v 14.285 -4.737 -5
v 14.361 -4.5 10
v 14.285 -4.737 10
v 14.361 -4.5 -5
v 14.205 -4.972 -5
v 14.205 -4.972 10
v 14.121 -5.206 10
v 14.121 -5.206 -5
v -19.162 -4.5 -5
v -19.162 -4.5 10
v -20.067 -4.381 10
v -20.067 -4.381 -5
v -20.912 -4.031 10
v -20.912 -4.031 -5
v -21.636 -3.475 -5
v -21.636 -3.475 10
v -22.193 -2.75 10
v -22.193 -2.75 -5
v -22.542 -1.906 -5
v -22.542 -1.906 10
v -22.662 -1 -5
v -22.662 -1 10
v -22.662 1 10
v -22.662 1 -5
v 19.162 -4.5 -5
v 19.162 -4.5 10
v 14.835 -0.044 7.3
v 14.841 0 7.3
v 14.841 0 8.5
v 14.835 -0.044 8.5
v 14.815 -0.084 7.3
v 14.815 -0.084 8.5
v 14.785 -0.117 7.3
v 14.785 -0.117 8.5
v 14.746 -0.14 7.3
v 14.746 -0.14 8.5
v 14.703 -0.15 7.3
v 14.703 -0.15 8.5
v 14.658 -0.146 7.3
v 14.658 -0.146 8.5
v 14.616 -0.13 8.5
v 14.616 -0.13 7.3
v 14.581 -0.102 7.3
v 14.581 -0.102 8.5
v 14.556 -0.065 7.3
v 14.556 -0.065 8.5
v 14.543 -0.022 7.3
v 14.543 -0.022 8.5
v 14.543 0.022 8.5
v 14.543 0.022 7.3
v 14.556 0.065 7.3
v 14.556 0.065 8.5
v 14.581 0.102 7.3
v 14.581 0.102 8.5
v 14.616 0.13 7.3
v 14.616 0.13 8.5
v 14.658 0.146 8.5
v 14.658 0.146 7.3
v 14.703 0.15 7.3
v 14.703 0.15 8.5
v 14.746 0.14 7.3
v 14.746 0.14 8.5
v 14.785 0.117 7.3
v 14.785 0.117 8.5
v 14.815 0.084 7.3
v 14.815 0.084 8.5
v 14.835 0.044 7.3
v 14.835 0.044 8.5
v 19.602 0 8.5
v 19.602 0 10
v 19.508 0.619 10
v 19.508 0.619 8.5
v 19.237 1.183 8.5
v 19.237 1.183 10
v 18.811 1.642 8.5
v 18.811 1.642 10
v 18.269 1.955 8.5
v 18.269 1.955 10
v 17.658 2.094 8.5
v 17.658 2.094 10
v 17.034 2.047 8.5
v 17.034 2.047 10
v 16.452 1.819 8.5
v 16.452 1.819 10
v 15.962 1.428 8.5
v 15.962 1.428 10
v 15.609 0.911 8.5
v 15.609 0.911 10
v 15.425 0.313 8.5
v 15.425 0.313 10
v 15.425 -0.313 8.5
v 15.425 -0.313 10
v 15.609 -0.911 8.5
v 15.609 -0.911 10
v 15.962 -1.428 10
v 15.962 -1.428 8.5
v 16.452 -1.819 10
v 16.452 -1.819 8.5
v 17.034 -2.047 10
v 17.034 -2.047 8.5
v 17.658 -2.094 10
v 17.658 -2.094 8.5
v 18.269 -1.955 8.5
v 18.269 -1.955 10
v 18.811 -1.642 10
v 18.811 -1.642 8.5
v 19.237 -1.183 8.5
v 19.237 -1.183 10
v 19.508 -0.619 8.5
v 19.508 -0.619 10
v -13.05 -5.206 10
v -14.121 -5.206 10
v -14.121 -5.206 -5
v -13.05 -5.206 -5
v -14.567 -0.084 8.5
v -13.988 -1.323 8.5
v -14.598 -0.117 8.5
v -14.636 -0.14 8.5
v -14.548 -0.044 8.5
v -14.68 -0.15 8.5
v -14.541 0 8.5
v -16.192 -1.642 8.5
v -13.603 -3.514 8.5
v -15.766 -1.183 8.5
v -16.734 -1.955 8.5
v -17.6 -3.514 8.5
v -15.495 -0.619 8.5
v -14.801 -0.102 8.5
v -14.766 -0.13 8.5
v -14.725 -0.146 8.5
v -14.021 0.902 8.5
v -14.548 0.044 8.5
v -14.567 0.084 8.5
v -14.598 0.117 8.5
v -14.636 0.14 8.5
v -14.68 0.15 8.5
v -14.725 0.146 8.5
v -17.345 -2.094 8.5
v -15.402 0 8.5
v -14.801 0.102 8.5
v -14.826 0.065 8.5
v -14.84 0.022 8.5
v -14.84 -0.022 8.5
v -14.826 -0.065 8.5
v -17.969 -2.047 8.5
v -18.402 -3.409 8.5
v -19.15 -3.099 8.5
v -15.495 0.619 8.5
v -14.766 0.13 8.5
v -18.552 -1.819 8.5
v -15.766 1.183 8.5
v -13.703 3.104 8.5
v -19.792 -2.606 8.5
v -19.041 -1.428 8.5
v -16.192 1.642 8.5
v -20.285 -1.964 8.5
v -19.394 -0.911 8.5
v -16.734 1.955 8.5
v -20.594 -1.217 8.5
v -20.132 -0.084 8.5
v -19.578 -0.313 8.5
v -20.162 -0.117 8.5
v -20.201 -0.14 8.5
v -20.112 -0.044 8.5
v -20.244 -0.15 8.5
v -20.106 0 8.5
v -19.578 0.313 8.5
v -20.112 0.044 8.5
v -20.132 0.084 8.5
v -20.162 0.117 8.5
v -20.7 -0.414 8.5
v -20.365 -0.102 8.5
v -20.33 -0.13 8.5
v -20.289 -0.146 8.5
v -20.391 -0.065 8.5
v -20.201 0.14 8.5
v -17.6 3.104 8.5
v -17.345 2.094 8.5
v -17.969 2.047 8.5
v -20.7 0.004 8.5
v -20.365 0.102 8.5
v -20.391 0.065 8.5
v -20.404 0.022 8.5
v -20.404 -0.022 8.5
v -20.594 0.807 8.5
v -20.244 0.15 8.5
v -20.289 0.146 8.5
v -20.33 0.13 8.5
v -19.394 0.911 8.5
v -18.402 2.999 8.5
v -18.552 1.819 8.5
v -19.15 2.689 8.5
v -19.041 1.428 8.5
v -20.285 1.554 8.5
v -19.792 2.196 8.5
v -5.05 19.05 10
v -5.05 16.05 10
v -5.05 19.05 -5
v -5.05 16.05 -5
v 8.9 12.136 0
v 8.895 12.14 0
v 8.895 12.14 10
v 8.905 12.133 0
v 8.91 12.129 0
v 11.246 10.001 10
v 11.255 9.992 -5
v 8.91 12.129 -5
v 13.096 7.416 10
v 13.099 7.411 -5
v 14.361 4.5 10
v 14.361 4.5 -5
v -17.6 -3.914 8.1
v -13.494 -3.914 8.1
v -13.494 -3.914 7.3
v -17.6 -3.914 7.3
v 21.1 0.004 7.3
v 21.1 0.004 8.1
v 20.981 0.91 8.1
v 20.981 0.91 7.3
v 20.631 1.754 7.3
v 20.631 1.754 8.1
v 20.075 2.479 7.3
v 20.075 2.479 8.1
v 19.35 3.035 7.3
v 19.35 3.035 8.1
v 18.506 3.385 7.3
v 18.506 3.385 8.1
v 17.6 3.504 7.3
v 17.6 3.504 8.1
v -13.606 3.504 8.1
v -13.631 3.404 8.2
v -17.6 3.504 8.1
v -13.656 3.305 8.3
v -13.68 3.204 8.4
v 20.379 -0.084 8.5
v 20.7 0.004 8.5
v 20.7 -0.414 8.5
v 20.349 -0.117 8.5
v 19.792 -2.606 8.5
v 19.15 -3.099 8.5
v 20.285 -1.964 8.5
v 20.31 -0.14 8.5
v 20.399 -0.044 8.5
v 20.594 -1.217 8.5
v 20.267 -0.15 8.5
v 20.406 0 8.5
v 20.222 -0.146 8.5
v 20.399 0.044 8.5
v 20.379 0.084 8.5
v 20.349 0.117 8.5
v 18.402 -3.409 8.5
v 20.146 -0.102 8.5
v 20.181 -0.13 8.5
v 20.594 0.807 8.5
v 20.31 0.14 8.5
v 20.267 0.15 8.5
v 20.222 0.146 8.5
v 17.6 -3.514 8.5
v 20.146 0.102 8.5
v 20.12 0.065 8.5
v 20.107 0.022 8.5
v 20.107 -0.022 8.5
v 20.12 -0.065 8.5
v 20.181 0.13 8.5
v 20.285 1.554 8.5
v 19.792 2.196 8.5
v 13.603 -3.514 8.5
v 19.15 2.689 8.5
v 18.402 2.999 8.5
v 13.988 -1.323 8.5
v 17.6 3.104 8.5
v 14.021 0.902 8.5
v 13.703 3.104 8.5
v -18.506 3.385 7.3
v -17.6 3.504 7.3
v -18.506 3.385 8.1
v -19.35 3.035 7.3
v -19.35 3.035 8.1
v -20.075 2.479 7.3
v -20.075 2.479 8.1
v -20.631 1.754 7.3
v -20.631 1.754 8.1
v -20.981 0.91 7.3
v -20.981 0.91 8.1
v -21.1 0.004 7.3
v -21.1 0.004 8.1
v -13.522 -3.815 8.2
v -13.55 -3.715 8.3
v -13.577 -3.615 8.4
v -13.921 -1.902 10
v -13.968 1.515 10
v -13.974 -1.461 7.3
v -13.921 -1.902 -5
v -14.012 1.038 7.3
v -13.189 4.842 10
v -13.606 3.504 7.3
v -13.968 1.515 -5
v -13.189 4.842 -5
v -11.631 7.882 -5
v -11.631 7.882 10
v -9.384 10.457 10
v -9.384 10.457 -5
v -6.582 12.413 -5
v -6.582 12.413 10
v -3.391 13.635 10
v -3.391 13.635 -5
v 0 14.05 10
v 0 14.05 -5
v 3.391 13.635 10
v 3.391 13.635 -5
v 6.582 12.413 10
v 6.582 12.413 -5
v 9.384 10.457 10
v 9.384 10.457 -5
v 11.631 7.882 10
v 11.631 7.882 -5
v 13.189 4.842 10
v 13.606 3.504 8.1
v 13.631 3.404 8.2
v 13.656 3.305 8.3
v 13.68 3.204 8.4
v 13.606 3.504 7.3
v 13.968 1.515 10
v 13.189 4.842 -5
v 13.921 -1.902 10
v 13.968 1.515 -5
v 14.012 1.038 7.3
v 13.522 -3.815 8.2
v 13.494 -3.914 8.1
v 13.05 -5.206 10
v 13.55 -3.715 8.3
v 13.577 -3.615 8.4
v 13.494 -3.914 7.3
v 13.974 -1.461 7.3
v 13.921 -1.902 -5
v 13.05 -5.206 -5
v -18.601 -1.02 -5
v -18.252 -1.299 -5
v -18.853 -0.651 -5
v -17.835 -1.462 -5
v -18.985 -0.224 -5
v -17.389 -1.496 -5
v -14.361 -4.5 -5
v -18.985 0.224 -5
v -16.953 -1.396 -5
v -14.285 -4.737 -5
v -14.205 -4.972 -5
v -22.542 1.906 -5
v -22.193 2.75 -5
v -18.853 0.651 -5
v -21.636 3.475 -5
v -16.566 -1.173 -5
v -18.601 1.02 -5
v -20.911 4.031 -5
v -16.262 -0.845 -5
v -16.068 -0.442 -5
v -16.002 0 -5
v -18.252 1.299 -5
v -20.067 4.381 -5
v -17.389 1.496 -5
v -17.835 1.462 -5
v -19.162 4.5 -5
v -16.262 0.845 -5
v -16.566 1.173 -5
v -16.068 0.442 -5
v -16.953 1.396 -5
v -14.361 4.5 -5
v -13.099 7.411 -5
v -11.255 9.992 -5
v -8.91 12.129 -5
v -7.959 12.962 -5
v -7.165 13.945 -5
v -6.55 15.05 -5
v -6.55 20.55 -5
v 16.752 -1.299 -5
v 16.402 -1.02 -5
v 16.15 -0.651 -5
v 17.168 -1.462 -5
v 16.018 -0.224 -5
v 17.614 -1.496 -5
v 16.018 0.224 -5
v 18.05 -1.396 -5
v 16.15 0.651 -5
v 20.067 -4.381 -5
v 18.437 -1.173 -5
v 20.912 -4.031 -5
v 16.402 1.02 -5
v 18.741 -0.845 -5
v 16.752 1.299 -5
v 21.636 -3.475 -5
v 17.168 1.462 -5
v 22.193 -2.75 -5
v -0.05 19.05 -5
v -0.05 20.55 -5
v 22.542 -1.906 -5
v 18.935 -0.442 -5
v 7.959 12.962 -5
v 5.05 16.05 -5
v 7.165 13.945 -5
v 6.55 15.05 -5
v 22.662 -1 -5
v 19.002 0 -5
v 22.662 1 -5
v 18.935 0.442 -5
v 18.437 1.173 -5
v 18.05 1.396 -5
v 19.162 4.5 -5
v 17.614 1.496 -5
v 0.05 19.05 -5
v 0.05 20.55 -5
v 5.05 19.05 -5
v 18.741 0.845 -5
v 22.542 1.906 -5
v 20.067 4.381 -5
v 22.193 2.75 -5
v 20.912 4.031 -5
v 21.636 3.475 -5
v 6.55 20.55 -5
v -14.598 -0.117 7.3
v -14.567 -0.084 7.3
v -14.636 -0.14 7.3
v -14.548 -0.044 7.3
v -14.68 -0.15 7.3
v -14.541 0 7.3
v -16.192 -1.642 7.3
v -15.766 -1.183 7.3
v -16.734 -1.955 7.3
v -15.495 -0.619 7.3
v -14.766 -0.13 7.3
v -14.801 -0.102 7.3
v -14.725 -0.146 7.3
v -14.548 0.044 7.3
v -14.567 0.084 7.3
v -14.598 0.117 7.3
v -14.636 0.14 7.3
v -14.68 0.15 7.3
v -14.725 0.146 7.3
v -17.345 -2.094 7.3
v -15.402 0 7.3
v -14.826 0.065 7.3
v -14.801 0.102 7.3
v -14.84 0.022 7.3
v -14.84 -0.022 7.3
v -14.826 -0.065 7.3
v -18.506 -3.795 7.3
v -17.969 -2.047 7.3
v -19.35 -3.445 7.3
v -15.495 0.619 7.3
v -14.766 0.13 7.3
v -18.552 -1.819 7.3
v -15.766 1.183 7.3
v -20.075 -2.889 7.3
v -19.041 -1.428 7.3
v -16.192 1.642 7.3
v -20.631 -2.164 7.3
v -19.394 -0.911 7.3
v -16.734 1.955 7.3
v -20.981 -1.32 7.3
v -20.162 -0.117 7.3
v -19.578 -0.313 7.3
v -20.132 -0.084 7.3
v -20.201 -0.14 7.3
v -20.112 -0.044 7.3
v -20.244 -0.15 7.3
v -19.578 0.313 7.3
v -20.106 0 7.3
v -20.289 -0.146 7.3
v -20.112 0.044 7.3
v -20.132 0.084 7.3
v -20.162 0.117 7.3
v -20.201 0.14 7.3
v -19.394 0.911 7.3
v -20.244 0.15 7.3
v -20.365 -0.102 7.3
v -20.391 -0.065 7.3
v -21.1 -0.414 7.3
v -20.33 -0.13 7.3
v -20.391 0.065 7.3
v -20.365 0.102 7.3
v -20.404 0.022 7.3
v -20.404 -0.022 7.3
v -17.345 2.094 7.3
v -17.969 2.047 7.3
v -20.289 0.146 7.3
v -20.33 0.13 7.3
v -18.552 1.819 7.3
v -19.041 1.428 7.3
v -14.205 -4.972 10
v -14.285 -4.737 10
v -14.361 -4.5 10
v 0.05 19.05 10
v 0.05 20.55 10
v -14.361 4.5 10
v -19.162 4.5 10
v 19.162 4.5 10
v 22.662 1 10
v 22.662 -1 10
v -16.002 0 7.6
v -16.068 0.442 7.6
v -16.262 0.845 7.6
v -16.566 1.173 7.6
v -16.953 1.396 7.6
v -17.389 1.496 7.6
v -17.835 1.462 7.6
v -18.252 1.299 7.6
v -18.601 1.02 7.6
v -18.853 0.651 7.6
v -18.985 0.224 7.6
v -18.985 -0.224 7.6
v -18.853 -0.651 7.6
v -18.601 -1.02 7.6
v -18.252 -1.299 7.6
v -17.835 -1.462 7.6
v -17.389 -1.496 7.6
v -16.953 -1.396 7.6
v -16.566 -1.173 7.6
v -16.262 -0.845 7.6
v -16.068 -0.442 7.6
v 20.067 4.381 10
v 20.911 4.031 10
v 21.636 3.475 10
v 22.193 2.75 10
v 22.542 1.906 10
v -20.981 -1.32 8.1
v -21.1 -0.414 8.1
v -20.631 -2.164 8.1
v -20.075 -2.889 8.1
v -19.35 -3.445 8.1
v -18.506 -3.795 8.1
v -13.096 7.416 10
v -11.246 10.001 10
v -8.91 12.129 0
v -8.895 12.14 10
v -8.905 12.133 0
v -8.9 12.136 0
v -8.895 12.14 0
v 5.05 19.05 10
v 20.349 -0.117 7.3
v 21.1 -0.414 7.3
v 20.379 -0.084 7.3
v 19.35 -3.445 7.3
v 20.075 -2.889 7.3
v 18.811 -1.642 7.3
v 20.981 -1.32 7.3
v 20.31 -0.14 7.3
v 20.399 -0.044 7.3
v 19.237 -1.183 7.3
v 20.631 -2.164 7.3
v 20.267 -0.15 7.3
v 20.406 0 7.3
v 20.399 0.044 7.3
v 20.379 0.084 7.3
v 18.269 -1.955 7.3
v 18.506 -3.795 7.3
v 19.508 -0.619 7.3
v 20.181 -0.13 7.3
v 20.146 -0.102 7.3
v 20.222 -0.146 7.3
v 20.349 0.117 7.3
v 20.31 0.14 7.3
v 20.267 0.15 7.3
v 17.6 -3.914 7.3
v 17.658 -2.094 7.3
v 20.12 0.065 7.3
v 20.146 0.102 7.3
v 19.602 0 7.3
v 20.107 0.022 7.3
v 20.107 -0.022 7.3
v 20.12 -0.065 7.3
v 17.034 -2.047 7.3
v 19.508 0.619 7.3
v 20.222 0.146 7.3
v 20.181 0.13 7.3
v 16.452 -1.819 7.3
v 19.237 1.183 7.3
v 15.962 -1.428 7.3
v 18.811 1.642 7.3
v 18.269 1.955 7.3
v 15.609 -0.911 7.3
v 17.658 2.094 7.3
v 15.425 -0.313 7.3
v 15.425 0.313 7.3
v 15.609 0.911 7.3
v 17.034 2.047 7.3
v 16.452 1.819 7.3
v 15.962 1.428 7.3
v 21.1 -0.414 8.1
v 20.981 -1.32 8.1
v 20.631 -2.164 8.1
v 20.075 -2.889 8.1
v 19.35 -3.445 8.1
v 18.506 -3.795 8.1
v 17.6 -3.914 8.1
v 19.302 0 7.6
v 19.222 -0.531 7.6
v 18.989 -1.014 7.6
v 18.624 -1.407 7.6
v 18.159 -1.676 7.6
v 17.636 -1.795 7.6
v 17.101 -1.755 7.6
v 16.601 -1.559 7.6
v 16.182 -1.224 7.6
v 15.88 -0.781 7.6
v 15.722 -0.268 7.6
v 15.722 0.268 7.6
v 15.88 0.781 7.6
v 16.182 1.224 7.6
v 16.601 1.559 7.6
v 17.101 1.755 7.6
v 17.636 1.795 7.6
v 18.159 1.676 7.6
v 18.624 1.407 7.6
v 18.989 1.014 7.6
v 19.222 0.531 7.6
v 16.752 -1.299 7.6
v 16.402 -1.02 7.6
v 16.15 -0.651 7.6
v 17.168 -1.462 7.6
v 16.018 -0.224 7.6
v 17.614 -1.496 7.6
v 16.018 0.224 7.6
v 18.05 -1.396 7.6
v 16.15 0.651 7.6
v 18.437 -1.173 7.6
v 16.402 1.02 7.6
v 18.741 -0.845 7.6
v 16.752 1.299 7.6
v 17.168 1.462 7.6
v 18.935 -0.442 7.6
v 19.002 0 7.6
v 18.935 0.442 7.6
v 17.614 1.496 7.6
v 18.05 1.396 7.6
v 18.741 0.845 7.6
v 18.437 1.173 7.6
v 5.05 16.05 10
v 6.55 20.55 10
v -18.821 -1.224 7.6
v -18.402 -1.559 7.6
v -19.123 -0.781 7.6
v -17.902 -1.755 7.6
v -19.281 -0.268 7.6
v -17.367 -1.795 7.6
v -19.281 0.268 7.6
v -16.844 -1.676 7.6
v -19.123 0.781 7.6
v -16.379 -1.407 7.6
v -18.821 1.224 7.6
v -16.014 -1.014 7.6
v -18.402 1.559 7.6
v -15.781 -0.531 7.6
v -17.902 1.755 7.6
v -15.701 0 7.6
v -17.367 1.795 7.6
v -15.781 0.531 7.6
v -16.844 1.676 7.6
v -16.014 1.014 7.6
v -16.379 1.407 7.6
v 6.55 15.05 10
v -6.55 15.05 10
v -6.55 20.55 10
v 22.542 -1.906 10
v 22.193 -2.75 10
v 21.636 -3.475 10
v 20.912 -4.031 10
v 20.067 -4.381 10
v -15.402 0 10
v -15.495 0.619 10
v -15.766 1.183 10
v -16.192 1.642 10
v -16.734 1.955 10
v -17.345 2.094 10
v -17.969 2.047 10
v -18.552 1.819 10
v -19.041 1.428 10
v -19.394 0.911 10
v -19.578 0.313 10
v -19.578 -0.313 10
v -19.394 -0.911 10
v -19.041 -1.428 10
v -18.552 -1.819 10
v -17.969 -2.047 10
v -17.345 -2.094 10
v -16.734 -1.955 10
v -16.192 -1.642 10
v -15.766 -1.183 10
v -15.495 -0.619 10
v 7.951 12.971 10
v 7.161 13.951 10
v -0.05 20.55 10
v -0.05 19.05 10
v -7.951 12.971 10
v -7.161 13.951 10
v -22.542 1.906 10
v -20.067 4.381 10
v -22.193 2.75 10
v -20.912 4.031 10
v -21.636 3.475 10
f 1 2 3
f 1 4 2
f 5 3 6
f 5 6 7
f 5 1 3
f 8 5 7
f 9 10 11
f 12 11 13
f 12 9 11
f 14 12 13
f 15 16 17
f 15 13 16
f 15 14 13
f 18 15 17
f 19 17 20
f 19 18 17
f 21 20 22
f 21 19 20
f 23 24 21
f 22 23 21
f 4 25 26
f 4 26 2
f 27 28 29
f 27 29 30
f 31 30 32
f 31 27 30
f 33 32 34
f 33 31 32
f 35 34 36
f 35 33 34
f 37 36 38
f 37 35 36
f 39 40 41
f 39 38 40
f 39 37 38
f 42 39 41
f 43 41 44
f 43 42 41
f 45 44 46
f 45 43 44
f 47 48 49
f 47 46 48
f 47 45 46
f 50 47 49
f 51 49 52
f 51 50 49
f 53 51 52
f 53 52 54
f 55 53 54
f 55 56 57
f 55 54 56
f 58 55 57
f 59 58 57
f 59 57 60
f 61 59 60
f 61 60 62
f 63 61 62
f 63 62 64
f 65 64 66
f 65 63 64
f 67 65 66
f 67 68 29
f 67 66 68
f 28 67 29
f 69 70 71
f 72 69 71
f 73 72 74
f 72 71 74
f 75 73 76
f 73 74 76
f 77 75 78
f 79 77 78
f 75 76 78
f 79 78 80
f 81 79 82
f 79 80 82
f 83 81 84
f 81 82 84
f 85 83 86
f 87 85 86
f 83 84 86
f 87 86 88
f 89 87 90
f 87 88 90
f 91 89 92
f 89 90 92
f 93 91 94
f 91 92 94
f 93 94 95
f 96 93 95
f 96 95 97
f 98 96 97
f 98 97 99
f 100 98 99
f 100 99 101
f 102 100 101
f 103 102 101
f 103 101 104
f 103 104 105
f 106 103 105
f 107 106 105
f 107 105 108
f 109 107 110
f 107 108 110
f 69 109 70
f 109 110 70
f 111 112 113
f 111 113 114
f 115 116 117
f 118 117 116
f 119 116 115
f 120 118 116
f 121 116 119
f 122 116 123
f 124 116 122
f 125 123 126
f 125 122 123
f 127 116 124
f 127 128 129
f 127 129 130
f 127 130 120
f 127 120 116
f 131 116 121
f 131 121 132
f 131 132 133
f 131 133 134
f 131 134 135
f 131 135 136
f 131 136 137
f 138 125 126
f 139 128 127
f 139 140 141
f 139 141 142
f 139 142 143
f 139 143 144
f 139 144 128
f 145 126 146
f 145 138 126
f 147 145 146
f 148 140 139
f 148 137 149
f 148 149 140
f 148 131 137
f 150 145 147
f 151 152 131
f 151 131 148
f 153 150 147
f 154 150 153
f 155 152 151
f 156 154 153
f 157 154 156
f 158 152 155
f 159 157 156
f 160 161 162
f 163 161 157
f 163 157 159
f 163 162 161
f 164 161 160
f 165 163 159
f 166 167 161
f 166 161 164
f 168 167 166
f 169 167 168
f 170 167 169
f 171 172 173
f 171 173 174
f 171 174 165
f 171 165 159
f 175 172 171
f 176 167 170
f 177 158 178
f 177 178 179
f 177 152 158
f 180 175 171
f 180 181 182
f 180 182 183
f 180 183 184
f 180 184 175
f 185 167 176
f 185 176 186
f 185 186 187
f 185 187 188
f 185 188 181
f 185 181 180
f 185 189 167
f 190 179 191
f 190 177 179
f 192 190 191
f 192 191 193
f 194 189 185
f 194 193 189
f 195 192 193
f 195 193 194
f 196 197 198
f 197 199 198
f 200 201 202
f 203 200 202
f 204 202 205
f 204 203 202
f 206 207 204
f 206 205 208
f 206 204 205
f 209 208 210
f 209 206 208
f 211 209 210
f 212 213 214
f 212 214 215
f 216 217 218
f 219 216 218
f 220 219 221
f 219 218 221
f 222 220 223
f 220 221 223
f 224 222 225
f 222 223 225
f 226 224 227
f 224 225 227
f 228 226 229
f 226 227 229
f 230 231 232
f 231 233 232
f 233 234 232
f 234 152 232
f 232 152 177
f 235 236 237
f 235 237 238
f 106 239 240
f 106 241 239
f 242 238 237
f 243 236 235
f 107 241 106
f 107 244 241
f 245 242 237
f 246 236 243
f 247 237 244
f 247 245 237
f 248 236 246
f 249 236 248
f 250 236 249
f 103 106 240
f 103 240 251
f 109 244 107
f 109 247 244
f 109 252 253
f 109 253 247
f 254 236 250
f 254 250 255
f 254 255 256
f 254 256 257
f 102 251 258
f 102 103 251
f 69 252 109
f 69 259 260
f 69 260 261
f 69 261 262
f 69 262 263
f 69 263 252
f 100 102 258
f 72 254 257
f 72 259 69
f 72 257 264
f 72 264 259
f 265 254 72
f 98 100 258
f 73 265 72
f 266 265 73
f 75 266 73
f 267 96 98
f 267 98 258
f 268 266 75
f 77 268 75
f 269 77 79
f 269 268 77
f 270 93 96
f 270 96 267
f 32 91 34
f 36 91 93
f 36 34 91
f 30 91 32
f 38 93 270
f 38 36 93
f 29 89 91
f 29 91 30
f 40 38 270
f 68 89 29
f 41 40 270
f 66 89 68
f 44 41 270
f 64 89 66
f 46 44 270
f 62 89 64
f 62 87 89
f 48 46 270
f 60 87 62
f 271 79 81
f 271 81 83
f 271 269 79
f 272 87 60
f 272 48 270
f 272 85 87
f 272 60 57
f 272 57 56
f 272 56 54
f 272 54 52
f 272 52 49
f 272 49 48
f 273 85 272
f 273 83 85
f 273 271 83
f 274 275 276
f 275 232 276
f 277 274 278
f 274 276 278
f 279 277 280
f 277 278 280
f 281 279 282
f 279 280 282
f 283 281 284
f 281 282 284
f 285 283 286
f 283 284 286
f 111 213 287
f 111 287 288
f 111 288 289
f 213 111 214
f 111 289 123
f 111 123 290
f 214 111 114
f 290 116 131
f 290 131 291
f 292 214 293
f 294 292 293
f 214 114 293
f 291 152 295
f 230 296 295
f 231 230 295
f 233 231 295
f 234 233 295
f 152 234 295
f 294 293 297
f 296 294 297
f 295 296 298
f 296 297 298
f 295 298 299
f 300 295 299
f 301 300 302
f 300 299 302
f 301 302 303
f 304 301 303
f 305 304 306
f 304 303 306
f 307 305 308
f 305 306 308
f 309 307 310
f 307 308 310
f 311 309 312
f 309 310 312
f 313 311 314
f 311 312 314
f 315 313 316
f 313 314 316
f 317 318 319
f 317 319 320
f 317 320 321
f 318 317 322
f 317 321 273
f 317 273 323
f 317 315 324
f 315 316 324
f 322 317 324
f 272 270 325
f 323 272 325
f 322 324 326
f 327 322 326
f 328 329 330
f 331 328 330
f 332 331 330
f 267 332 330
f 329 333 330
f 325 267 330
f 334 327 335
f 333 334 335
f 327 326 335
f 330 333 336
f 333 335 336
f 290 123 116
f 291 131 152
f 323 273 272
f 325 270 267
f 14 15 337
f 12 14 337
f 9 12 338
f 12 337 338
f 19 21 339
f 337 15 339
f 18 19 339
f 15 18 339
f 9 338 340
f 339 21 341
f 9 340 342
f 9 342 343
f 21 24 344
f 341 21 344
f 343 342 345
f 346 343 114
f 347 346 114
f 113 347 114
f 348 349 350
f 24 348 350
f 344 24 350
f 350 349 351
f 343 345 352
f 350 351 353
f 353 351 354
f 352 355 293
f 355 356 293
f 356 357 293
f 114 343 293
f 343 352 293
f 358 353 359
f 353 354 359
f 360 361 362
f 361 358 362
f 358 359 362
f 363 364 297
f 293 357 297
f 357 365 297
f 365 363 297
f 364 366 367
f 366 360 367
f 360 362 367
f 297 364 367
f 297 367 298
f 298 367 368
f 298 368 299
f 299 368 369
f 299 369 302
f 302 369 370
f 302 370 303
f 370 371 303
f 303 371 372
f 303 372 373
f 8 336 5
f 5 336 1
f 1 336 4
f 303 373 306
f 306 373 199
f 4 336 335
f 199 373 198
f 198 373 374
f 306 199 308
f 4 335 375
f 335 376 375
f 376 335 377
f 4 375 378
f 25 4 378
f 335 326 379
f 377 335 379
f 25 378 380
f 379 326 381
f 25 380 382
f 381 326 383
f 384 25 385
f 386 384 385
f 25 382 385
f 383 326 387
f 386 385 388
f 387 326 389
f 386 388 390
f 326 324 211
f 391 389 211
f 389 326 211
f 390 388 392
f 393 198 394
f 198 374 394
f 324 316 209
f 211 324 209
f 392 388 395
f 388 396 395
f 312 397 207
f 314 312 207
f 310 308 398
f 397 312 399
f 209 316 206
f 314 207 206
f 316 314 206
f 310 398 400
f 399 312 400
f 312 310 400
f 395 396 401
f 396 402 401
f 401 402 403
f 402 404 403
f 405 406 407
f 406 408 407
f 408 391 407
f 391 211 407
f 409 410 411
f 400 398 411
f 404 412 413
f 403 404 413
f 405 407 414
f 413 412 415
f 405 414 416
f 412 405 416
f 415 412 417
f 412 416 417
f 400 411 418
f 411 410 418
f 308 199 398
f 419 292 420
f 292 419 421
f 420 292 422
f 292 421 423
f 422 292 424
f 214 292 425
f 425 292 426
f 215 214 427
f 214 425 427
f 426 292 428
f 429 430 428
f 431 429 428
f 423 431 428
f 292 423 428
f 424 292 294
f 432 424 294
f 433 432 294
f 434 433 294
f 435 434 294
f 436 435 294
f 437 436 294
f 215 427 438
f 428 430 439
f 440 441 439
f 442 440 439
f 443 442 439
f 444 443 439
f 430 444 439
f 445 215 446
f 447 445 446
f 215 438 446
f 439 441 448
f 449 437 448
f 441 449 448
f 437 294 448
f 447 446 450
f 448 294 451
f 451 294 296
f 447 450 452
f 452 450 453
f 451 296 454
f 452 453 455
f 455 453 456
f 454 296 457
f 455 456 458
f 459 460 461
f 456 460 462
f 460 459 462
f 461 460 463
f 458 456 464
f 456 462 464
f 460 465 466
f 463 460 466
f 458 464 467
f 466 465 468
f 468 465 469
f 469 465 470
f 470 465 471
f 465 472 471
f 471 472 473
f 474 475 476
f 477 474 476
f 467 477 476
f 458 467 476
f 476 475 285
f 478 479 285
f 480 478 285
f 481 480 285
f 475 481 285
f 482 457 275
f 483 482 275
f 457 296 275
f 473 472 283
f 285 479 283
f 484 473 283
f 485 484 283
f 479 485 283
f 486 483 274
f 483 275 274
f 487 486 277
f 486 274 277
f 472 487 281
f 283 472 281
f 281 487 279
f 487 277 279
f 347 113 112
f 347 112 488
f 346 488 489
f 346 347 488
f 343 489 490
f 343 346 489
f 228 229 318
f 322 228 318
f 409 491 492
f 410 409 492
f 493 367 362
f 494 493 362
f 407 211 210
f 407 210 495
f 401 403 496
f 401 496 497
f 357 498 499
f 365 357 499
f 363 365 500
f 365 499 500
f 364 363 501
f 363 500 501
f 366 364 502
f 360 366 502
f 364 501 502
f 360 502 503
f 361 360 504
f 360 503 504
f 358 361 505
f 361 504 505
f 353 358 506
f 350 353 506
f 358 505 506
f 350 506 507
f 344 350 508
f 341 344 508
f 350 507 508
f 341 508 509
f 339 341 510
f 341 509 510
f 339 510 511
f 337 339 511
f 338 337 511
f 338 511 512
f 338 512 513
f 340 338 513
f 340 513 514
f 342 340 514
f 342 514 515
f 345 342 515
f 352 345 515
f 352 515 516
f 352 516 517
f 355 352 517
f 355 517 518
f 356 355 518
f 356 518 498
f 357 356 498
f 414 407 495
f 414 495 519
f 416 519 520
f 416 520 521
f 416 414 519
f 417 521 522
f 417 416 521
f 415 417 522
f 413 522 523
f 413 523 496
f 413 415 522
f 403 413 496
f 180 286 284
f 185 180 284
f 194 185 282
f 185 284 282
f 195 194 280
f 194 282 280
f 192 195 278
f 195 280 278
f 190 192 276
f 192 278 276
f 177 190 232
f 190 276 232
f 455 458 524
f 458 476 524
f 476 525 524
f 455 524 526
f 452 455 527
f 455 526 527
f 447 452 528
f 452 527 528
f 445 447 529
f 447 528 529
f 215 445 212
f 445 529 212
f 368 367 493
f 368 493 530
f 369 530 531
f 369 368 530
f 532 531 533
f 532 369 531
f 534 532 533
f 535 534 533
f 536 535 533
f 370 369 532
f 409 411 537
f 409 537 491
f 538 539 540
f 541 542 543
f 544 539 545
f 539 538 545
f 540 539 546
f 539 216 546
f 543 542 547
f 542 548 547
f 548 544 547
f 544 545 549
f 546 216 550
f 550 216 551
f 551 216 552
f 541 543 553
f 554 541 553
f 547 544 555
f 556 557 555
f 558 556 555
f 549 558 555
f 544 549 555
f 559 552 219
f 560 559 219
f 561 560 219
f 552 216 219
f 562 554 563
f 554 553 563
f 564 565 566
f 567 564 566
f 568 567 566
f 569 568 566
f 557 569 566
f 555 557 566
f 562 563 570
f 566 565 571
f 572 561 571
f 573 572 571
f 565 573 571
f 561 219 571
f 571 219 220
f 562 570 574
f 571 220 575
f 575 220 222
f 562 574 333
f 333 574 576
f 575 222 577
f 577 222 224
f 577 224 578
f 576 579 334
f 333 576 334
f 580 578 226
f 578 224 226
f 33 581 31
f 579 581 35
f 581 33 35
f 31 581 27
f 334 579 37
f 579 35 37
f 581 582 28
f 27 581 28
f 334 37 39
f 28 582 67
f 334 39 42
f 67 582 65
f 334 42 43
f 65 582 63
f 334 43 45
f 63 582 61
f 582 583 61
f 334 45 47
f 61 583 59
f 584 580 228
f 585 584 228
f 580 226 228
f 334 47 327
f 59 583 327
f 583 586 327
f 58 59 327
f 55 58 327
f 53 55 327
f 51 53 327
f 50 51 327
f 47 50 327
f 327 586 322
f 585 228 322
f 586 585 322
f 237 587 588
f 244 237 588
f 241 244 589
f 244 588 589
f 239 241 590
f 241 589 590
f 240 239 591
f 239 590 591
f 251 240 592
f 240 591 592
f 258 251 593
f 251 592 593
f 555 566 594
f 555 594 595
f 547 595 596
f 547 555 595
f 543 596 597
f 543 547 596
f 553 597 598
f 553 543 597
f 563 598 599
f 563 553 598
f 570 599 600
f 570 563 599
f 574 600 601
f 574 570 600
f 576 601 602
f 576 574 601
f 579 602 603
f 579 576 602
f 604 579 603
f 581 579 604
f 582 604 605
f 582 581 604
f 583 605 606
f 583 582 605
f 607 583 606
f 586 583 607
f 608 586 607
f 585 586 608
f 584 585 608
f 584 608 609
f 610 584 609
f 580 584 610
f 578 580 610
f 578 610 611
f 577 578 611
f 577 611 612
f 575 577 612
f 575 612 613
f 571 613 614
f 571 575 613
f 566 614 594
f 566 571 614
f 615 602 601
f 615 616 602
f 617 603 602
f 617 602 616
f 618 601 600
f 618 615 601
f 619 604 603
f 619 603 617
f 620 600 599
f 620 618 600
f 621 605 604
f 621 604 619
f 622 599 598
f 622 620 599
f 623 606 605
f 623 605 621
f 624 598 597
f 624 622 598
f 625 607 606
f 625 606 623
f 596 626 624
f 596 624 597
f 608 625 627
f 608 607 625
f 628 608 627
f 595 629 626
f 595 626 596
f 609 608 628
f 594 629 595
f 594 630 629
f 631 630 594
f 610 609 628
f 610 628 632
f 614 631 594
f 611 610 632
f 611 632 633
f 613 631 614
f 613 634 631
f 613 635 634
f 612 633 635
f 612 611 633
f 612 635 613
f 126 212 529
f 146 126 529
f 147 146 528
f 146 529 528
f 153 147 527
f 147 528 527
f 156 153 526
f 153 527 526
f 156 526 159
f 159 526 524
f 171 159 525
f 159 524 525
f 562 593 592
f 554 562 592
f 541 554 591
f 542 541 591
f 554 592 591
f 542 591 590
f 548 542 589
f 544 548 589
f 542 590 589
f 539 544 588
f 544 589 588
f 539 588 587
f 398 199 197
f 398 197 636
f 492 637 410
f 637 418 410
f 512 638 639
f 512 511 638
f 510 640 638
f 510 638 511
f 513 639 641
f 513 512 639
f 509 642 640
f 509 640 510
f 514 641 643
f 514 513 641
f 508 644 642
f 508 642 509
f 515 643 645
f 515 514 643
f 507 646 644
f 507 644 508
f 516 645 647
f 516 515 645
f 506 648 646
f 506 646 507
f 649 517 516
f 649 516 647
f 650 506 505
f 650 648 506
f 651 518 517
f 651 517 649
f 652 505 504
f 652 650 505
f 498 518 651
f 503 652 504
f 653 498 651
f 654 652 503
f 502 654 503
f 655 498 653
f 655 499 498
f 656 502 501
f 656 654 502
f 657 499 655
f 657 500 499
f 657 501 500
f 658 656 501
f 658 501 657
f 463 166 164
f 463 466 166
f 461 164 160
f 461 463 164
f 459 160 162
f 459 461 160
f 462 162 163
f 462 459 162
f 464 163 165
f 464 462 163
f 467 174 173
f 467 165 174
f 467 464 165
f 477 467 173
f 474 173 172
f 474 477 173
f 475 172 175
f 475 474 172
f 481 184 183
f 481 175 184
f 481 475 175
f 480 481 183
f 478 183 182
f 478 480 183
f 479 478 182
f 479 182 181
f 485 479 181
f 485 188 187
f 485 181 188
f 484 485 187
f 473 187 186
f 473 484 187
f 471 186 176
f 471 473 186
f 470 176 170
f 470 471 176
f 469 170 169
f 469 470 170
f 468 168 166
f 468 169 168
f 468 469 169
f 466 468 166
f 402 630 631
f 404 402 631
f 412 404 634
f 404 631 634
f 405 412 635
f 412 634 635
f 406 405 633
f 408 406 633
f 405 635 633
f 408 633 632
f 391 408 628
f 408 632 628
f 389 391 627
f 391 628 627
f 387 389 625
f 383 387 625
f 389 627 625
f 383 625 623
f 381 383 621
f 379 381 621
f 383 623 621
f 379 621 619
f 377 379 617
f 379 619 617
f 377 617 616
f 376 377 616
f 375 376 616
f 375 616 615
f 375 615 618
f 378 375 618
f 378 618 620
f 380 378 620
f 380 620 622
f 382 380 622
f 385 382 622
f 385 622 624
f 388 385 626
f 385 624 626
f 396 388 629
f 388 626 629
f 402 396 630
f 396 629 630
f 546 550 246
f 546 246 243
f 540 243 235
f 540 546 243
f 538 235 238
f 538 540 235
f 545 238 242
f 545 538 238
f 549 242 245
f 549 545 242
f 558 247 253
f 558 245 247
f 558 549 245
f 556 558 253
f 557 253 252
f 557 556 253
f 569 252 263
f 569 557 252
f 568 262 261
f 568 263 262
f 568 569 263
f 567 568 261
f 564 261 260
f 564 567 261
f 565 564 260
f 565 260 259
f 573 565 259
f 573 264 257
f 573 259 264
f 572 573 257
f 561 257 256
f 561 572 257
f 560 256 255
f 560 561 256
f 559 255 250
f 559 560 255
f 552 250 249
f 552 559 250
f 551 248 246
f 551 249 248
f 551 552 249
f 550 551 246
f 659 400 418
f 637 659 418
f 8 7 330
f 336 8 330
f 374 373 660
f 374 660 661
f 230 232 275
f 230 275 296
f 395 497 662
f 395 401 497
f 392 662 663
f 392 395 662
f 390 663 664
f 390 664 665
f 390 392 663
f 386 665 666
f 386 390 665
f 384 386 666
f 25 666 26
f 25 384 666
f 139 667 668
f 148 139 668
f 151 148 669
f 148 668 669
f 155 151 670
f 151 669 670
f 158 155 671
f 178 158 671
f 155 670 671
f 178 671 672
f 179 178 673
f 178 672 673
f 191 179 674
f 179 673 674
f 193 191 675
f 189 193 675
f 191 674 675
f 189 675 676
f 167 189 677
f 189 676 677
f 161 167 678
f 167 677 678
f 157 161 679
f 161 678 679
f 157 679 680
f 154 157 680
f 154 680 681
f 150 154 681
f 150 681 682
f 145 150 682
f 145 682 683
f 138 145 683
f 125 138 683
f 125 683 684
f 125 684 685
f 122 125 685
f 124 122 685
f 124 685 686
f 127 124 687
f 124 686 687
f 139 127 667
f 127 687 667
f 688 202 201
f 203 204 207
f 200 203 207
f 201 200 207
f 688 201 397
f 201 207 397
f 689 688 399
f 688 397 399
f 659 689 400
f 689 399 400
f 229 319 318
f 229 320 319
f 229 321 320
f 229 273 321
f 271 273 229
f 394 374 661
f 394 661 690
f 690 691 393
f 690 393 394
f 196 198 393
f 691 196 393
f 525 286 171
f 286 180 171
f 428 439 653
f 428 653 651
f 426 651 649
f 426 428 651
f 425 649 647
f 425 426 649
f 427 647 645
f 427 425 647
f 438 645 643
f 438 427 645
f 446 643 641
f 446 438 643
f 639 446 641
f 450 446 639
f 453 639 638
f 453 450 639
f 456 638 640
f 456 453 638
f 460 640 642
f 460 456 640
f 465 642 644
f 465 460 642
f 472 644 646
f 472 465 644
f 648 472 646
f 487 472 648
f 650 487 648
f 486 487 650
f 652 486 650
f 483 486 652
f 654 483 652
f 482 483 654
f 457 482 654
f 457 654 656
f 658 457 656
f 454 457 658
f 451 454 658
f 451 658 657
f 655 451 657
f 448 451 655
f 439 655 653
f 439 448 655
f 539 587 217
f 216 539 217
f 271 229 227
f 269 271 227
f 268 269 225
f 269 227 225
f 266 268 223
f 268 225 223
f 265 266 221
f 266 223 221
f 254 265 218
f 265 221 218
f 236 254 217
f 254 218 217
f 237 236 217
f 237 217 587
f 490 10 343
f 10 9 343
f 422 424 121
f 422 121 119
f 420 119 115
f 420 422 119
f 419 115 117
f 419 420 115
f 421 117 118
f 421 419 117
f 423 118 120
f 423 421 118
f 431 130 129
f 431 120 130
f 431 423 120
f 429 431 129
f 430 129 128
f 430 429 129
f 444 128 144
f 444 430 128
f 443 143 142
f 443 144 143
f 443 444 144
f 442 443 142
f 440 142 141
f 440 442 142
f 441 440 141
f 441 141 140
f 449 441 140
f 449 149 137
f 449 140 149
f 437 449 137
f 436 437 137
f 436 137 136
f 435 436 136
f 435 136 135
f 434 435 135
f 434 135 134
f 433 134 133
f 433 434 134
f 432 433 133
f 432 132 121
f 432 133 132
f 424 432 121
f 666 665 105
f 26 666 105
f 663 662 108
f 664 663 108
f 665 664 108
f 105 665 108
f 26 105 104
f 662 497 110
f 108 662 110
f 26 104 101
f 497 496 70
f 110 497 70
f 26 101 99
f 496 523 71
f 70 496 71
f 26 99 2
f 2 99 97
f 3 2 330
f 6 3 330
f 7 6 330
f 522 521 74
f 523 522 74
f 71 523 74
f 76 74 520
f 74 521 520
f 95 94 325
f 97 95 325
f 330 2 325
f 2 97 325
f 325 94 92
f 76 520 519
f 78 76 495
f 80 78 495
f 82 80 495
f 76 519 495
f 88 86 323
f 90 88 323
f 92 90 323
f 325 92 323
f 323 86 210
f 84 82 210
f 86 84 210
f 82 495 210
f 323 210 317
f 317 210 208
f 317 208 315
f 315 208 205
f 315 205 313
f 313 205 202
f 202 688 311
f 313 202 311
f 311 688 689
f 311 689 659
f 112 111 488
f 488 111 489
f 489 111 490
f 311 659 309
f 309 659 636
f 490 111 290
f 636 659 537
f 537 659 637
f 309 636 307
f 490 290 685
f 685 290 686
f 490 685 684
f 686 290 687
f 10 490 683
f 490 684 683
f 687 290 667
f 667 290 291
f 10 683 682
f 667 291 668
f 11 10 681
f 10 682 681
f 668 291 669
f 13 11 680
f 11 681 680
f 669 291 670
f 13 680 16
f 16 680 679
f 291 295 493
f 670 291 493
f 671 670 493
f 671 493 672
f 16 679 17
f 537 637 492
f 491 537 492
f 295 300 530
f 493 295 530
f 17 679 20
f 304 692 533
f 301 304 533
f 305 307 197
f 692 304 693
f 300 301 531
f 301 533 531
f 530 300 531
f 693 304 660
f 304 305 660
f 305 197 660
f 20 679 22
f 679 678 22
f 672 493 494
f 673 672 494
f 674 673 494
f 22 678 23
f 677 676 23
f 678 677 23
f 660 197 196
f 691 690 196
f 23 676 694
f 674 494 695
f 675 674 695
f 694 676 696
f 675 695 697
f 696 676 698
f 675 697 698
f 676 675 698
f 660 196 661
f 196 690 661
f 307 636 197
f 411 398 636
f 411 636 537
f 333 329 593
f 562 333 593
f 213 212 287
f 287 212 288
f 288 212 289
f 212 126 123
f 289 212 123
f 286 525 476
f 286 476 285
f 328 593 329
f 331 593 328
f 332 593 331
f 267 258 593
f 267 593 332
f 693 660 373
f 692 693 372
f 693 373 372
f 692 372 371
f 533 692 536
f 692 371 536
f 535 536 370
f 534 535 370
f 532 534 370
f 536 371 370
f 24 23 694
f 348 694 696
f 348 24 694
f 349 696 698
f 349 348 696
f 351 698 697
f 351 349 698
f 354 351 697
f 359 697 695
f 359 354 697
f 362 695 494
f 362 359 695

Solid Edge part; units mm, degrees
sketch "Sketch1" plane through (0, 0, 0) normal (0, 0, 1) x (1, 0, 0)
  line L0 (14.3615, 4.5) -> (19.1615, 4.5)
  arc A0 (19.1615, 4.5) -> (22.6615, 1) centre (19.1615, 1) cw
  line L1 (22.6615, 1) -> (22.6615, -1)
  arc A1 (22.6615, -1) -> (19.1615, -4.5) centre (19.1615, -1) cw
  line L2 (19.1615, -4.5) -> (14.3615, -4.5)
  arc A2 (14.3615, -4.5) -> (14.121, -5.2058) centre (0, 0) cw
  line L3 (14.121, -5.2058) -> (13.05, -5.2058)
  arc A3 (0, 14.05) -> (-13.05, -5.2058) centre (0, 0) ccw
  line L4 (-14.121, -5.2058) -> (-13.05, -5.2058)
  arc A4 (-14.3615, -4.5) -> (-14.121, -5.2058) centre (0, 0) ccw
  line L5 (-19.1615, -4.5) -> (-14.3615, -4.5)
  arc A5 (-22.6615, -1) -> (-19.1615, -4.5) centre (-19.1615, -1) ccw
  line L6 (-22.6615, 1) -> (-22.6615, -1)
  arc A6 (-19.1615, 4.5) -> (-22.6615, 1) centre (-19.1615, 1) ccw
  line L7 (-14.3615, 4.5) -> (-19.1615, 4.5)
  arc A7 (0, 15.05) -> (-14.3615, 4.5) centre (0, 0) ccw
  arc A8 (0, 15.05) -> (14.3615, 4.5) centre (0, 0) cw
  arc A9 (0, 14.05) -> (13.05, -5.2058) centre (0, 0) cw
extrude "Protrusion1" add sketch "Sketch1" along normal blind 10
sketch "Sketch2" plane through (0, 4.9221, 10) normal (0, 0, 1) x (1, 0, 0)
  circle A0 centre (17.5015, -4.9221) radius 2.1
  circle A1 centre (-17.5015, -4.9221) radius 2.1
extrude "Wycięcie_3" cut sketch "Sketch2" against normal blind 2.4
fillet "Zaokrąglenie_2" [suppressed]
sketch "Sketch3" plane through (0, 4.9221, 0) normal (0, 0, -1) x (-1, 0, 0)
  arc A0 (6.55, 10.1279) -> (8.91, 7.2069) centre (13.2727, 13.1457) ccw
  arc A1 (0, 10.1279) -> (8.91, 7.2069) centre (0, -4.9221) cw
  arc A2 (0, 10.1279) -> (-8.91, 7.2069) centre (0, -4.9221) ccw
  arc A3 (-6.55, 10.1279) -> (-8.91, 7.2069) centre (-13.2727, 13.1457) cw
  line L0 (-6.55, 10.1279) -> (-6.55, 15.6279)
  line L1 (-6.55, 15.6279) -> (-0.05, 15.6279)
  line L2 (-0.05, 14.1279) -> (-0.05, 15.6279)
  line L3 (-5.05, 14.1279) -> (-0.05, 14.1279)
  line L4 (-5.05, 11.1279) -> (-5.05, 14.1279)
  line L5 (0, 11.1279) -> (-5.05, 11.1279)
  line L6 (0, 11.1279) -> (5.05, 11.1279)
  line L7 (5.05, 11.1279) -> (5.05, 14.1279)
  line L8 (5.05, 14.1279) -> (0.05, 14.1279)
  line L9 (0.05, 14.1279) -> (0.05, 15.6279)
  line L10 (6.55, 15.6279) -> (0.05, 15.6279)
  line L11 (6.55, 10.1279) -> (6.55, 15.6279)
extrude "Protrusion2" add sketch "Sketch3" against normal up to vertex (10 mm away)
sketch "Sketch4" plane through (0, 4.9221, 0) normal (0, 0, -1) x (-1, 0, 0)
  arc A0 (-14.3615, -0.4221) -> (-8.91, 7.2069) centre (0, -4.9221) cw
  arc A1 (-6.55, 10.1279) -> (-8.91, 7.2069) centre (-13.2727, 13.1457) cw
  line L0 (-6.55, 10.1279) -> (-6.55, 15.6279)
  line L1 (-6.55, 15.6279) -> (-0.05, 15.6279)
  line L2 (-0.05, 14.1279) -> (-0.05, 15.6279)
  line L3 (-5.05, 14.1279) -> (-0.05, 14.1279)
  line L4 (-5.05, 11.1279) -> (-5.05, 14.1279)
  line L5 (0, 11.1279) -> (-5.05, 11.1279)
  line L6 (0, 11.1279) -> (5.05, 11.1279)
  line L7 (5.05, 11.1279) -> (5.05, 14.1279)
  line L8 (5.05, 14.1279) -> (0.05, 14.1279)
  line L9 (0.05, 14.1279) -> (0.05, 15.6279)
  line L10 (6.55, 15.6279) -> (0.05, 15.6279)
  line L11 (6.55, 10.1279) -> (6.55, 15.6279)
  arc A2 (6.55, 10.1279) -> (8.91, 7.2069) centre (13.2727, 13.1457) ccw
  arc A3 (8.91, 7.2069) -> (14.3615, -0.4221) centre (0, -4.9221) cw
  line L12 (14.3615, -0.4221) -> (19.1615, -0.4221)
  arc A4 (19.1615, -0.4221) -> (22.6615, -3.9221) centre (19.1615, -3.9221) cw
  line L13 (22.6615, -3.9221) -> (22.6615, -5.9221)
  arc A5 (22.6615, -5.9221) -> (19.1615, -9.4221) centre (19.1615, -5.9221) cw
  line L14 (19.1615, -9.4221) -> (14.3615, -9.4221)
  arc A6 (14.3615, -9.4221) -> (14.121, -10.1279) centre (0, -4.9221) cw
  line L15 (14.121, -10.1279) -> (13.05, -10.1279)
  arc A7 (13.05, -10.1279) -> (-13.05, -10.1279) centre (0, -4.9221) ccw
  line L16 (-13.05, -10.1279) -> (-14.121, -10.1279)
  arc A8 (-14.121, -10.1279) -> (-14.3615, -9.4221) centre (0, -4.9221) cw
  line L17 (-14.3615, -9.4221) -> (-19.1615, -9.4221)
  arc A9 (-19.1615, -9.4221) -> (-22.6615, -5.9221) centre (-19.1615, -5.9221) cw
  line L18 (-22.6615, -5.9221) -> (-22.6615, -3.9221)
  arc A10 (-22.6615, -3.9221) -> (-19.1615, -0.4221) centre (-19.1615, -3.9221) cw
  line L19 (-19.1615, -0.4221) -> (-14.3615, -0.4221)
extrude "Wycięcie_8" add sketch "Sketch4" along normal blind 5
sketch "Sketch5" plane through (0, 7.6721, 8.5) normal (0, 0, 1) x (1, 0, 0)
  line L0 (-17.6, -4.1679) -> (-13.05, -4.1679)
  line L1 (-13.05, -4.1679) -> (-13.05, -11.5863)
  line L2 (-13.05, -11.5863) -> (-17.6, -11.5863)
  arc A0 (-17.6, -11.5863) -> (-21.1, -8.0863) centre (-17.6, -8.0863) cw
  line L3 (-21.1, -8.0863) -> (-21.1, -7.6679)
  arc A1 (-17.6, -4.1679) -> (-21.1, -7.6679) centre (-17.6, -7.6679) ccw
  arc A2 (17.6, -4.1679) -> (21.1, -7.6679) centre (17.6, -7.6679) cw
  line L4 (21.1, -8.0863) -> (21.1, -7.6679)
  arc A3 (17.6, -11.5863) -> (21.1, -8.0863) centre (17.6, -8.0863) ccw
  line L5 (13.05, -11.5863) -> (17.6, -11.5863)
  line L6 (13.05, -4.1679) -> (13.05, -11.5863)
  line L7 (17.6, -4.1679) -> (13.05, -4.1679)
extrude "Cutout1" cut sketch "Sketch5" against normal blind 1.2
chamfer "Faza_3" distance 0.4 angle 45 10 edges at (-15.603, 3.5042, 8.5) (-20.0749, 2.4791, 8.5) (-21.1, -0.205, 8.5) (-20.0749, -2.889, 8.5) (-15.5469, -3.9141, 8.5) (15.603, 3.5042, 8.5) (20.0749, 2.4791, 8.5) (21.1, -0.205, 8.5) (20.0749, -2.889, 8.5) (15.5469, -3.9141, 8.5)
sketch "Sketch6" plane through (-17.2969, -0.205, 7.3) normal (0, 0, 1) x (1, 0, 0)
  circle A0 centre (-0.2046, 0.205) radius 2.1
  circle A1 centre (34.7984, 0.205) radius 2.1
extrude "Wyciągnięcie_7" add sketch "Sketch6" along normal blind 0.3
chamfer "Faza_4" distance 0.3 angle 45 2 edges at (-19.6015, 0, 7.6) (15.4015, 0, 7.6)
sketch "Sketch7" plane through (-17.2969, -0.205, 7.3) normal (0, 0, 1) x (1, 0, 0)
  circle A0 centre (2.6056, 0.205) radius 0.15
  circle A1 centre (-2.9586, 0.205) radius 0.15
  circle A2 centre (31.9882, 0.205) radius 0.15
  circle A3 centre (37.5524, 0.205) radius 0.15
extrude "Protrusion3" add sketch "Sketch7" along normal up to vertex (1.2 mm away)
sketch "Sketch8" plane through (-17.5015, 0, 7.6) normal (0, 0, 1) x (1, 0, 0)
  circle A0 centre (0, 0) radius 1.5
  circle A1 centre (35.003, 0) radius 1.5
extrude "Cutout2" cut sketch "Sketch8" against normal through all
